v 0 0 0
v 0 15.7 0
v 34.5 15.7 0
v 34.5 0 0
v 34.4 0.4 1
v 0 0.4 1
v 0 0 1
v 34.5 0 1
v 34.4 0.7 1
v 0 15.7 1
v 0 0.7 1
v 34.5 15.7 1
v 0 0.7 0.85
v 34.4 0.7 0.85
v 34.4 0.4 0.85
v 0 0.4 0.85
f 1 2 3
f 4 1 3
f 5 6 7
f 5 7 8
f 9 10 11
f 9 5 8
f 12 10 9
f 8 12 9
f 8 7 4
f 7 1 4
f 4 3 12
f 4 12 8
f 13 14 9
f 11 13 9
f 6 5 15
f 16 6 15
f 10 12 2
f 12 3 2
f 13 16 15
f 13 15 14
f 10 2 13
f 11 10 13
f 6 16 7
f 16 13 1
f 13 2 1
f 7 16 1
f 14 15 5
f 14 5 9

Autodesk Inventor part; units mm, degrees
ref_plane "YZ Plane" through (0, 0, 0) normal (1, 0, 0) x (0, 1, 0)
ref_plane "XZ Plane" through (0, 0, 0) normal (0, 1, 0) x (-1, 0, 0)
ref_plane "XY Plane" through (0, 0, 0) normal (0, 0, 1) x (1, 0, 0)
sketch "Sketch1" plane through (0, 0, 0) normal (0, 0, 1) x (1, 0, 0)
  line L0 (0, 0) -> (34.5, 0)
  line L1 (34.5, 0) -> (34.5, 15.7)
  line L2 (34.5, 15.7) -> (0, 15.7)
  line L3 (0, 15.7) -> (0, 0)
  dimension "d0" = 34.5
  dimension "d1" = 15.7
extrude "Extrusion1" add sketch "Sketch1" along normal blind 1
sketch "Sketch3" plane through (34.5, 0, 0) normal (1, 0, 0) x (0, 0, -1)
  line L0 (-1, 15.7) -> (-1, 0) projected
  line L1 (-1, 0.4) -> (-0.85, 0.4)
  line L2 (-0.85, 0.4) -> (-0.85, 0.7)
  line L3 (-0.85, 0.7) -> (-1, 0.7)
  line L4 (-1, 0.7) -> (-1, 0.4)
  line L5 (0, 0) -> (-1, 0) projected
  dimension "d8" = 0.15
  dimension "d9" = 0.3
  dimension "d12" = 0.4
extrude "Extrusion3" cut sketch "Sketch3" against normal through all
sketch "Sketch4" plane through (0, 0.4, 0.85) normal (0, 0, 1) x (1, 0, 0)
  line L0 (0, 0.3) -> (34.5, 0.3) projected
  line L1 (34.5, 0) -> (34.4, 0)
  line L2 (34.4, 0) -> (34.4, 0.3)
  line L3 (34.4, 0.3) -> (34.5, 0.3)
  line L4 (34.5, 0.3) -> (34.5, 0)
  point P0 (0, -0.4)
  dimension "d13" = 0.1
extrude "Extrusion4" add sketch "Sketch4" along normal blind 0.15
properties part number "Zijkant 1"
